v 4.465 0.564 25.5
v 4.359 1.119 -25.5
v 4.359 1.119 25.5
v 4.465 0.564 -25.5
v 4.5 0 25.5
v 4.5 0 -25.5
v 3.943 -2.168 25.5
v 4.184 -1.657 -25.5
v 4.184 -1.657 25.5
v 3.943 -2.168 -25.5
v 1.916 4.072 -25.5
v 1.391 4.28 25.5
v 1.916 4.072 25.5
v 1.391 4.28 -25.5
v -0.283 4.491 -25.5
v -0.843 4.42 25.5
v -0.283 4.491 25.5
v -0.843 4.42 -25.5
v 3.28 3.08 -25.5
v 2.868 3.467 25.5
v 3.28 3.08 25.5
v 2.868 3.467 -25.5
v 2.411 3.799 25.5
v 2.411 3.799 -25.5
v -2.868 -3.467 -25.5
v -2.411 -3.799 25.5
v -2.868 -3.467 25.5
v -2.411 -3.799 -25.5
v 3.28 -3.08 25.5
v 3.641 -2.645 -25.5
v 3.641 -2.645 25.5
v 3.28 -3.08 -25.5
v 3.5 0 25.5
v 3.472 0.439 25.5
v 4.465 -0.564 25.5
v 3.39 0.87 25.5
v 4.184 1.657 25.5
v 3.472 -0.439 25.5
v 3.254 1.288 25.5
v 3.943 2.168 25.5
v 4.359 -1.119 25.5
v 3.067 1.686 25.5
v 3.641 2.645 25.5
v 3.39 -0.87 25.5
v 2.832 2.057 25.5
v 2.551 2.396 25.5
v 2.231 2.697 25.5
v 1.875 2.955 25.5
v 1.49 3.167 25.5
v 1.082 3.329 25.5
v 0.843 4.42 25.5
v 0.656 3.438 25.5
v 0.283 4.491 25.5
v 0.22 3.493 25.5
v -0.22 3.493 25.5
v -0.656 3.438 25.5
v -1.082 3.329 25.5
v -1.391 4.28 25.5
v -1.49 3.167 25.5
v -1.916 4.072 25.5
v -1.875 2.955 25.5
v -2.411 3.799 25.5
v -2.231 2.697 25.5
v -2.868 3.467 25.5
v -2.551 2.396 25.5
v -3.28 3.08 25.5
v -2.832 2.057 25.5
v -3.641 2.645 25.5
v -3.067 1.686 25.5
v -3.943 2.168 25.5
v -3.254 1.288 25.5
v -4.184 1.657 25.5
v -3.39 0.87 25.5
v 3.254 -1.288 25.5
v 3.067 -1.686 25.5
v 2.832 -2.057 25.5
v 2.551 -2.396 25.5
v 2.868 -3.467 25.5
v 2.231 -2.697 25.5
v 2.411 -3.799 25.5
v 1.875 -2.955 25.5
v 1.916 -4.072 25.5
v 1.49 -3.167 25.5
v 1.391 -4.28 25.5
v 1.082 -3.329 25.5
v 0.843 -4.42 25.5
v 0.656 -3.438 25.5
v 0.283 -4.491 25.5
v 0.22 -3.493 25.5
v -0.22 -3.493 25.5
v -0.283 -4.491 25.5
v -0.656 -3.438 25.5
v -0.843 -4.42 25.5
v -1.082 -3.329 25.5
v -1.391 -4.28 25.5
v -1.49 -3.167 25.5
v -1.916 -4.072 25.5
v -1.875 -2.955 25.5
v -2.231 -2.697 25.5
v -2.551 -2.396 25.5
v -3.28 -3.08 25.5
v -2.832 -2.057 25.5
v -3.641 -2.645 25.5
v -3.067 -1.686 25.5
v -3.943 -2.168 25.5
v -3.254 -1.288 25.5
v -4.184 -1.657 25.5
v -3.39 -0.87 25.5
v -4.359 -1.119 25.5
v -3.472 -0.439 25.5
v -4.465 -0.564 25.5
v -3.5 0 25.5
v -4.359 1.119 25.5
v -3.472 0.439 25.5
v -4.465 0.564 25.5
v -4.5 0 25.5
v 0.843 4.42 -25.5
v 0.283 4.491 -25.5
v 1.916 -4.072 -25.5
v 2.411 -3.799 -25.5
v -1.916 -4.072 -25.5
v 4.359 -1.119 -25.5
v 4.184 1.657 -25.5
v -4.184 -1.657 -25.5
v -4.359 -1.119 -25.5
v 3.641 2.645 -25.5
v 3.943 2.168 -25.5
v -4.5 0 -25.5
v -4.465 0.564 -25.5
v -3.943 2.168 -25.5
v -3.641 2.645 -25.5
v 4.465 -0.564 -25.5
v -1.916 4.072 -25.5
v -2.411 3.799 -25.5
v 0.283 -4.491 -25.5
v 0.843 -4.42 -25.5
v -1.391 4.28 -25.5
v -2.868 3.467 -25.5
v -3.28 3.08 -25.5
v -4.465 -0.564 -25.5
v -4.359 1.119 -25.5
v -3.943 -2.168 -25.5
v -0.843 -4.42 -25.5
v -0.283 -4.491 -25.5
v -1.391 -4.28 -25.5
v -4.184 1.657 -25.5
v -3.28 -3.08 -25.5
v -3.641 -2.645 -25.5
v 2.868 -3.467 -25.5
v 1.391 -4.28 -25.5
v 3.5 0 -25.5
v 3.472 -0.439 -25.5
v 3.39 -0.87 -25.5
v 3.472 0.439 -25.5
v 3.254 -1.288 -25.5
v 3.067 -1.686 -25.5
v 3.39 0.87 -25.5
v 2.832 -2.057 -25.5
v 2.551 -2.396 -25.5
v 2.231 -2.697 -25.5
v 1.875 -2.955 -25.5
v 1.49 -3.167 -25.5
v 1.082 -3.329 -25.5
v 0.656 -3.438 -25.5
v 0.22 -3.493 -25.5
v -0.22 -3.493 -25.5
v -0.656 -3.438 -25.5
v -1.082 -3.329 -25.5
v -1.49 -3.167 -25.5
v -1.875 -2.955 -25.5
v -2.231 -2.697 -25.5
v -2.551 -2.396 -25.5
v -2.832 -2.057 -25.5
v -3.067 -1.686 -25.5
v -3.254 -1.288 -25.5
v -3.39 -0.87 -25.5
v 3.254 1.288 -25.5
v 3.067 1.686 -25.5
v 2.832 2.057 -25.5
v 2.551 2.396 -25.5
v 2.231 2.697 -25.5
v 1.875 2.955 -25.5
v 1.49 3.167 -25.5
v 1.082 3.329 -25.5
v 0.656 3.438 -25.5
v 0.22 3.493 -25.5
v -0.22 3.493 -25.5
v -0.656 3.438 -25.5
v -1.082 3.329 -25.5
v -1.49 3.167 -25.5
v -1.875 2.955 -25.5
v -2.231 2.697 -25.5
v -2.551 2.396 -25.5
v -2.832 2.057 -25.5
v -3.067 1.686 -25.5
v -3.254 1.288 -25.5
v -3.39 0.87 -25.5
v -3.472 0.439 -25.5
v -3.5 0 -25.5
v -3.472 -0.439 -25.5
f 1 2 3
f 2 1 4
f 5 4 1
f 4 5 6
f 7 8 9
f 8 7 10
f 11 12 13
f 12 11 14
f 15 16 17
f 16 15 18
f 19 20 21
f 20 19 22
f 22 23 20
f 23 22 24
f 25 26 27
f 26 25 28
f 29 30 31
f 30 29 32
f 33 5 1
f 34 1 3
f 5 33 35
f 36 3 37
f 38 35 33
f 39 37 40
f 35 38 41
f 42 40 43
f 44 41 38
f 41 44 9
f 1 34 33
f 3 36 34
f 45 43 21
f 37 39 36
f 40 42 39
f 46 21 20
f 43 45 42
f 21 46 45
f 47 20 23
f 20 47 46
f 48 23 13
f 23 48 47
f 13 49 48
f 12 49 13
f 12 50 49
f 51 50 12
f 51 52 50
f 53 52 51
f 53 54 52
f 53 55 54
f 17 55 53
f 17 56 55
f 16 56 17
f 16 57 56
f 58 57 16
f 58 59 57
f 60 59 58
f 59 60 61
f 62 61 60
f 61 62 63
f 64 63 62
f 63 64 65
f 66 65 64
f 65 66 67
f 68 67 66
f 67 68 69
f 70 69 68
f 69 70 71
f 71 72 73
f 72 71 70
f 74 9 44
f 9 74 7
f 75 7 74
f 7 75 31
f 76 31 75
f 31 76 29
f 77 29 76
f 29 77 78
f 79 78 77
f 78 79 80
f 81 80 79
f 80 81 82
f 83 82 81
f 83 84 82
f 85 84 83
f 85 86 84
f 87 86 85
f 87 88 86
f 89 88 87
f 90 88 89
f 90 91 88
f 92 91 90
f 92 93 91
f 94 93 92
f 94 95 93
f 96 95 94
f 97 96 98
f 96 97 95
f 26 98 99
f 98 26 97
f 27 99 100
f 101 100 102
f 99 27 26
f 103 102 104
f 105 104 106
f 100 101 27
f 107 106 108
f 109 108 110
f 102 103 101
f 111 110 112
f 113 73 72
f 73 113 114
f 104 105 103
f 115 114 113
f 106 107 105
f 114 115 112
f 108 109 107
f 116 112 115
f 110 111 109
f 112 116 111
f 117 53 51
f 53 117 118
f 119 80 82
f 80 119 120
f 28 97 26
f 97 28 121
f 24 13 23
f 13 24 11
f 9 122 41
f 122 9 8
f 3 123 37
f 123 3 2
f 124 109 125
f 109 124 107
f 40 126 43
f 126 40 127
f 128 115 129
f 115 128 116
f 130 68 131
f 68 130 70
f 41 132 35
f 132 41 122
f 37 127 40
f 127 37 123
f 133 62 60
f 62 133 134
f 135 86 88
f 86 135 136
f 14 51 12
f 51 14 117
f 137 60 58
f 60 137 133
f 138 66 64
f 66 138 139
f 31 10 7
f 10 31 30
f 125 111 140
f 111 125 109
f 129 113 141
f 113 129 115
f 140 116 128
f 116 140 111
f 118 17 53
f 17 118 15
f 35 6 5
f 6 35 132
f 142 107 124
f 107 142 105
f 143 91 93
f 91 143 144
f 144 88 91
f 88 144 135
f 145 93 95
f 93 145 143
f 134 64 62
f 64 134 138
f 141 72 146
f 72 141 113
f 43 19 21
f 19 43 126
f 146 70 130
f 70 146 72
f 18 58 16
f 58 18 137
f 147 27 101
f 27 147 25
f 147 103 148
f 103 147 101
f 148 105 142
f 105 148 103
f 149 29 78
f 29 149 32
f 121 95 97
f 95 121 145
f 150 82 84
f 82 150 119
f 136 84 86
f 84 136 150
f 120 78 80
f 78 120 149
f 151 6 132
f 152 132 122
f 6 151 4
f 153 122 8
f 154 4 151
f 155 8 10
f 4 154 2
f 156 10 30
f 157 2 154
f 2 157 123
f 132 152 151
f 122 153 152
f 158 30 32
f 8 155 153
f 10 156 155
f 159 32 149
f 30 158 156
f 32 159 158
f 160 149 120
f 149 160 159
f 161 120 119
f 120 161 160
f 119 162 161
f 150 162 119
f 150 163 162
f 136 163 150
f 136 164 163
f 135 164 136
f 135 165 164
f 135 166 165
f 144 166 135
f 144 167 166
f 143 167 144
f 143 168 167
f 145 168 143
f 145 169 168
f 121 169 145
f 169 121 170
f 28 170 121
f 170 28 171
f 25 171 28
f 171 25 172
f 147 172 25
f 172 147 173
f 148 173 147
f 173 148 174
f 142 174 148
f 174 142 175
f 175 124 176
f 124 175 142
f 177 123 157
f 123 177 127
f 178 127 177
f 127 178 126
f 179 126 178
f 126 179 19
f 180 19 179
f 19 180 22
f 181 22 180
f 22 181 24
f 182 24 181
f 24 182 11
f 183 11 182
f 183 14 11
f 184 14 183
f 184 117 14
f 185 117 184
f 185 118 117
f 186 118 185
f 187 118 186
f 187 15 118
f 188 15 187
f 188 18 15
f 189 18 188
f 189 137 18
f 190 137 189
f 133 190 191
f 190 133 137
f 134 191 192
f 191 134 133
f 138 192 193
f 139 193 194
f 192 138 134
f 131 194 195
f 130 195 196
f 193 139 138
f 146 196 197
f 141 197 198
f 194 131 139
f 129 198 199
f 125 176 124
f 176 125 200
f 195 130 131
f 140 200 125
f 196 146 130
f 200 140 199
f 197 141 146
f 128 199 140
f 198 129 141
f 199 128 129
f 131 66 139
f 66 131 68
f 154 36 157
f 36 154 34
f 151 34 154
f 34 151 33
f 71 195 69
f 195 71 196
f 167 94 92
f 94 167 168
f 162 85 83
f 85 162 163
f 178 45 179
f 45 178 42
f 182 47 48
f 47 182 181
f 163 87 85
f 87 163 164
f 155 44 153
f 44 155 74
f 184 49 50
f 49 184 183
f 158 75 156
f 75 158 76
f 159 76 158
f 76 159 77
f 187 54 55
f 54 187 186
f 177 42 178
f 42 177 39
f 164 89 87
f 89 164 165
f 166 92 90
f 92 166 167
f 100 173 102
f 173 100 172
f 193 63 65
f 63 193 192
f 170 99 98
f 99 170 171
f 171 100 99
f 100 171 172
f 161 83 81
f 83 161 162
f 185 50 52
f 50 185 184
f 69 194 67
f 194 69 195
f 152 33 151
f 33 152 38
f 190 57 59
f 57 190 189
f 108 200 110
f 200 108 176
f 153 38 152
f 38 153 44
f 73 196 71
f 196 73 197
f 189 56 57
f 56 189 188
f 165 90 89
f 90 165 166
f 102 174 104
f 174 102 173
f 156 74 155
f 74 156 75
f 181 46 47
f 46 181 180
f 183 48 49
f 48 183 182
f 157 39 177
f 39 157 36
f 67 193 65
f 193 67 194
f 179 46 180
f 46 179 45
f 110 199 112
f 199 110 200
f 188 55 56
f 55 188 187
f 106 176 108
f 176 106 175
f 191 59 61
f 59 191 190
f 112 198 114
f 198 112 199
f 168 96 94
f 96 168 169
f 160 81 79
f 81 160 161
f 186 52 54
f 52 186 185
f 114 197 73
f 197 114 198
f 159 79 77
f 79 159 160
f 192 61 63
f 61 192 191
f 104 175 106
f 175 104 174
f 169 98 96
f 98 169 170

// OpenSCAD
$fn = 50;


difference() {
	union() {
		translate(v = [0, 0, -25.5000000000]) {
			cylinder(h = 51, r = 4.5000000000);
		}
	}
	union() {
		translate(v = [0, 0, -100.0000000000]) {
			cylinder(h = 200, r = 3.5000000000);
		}
	}
}
